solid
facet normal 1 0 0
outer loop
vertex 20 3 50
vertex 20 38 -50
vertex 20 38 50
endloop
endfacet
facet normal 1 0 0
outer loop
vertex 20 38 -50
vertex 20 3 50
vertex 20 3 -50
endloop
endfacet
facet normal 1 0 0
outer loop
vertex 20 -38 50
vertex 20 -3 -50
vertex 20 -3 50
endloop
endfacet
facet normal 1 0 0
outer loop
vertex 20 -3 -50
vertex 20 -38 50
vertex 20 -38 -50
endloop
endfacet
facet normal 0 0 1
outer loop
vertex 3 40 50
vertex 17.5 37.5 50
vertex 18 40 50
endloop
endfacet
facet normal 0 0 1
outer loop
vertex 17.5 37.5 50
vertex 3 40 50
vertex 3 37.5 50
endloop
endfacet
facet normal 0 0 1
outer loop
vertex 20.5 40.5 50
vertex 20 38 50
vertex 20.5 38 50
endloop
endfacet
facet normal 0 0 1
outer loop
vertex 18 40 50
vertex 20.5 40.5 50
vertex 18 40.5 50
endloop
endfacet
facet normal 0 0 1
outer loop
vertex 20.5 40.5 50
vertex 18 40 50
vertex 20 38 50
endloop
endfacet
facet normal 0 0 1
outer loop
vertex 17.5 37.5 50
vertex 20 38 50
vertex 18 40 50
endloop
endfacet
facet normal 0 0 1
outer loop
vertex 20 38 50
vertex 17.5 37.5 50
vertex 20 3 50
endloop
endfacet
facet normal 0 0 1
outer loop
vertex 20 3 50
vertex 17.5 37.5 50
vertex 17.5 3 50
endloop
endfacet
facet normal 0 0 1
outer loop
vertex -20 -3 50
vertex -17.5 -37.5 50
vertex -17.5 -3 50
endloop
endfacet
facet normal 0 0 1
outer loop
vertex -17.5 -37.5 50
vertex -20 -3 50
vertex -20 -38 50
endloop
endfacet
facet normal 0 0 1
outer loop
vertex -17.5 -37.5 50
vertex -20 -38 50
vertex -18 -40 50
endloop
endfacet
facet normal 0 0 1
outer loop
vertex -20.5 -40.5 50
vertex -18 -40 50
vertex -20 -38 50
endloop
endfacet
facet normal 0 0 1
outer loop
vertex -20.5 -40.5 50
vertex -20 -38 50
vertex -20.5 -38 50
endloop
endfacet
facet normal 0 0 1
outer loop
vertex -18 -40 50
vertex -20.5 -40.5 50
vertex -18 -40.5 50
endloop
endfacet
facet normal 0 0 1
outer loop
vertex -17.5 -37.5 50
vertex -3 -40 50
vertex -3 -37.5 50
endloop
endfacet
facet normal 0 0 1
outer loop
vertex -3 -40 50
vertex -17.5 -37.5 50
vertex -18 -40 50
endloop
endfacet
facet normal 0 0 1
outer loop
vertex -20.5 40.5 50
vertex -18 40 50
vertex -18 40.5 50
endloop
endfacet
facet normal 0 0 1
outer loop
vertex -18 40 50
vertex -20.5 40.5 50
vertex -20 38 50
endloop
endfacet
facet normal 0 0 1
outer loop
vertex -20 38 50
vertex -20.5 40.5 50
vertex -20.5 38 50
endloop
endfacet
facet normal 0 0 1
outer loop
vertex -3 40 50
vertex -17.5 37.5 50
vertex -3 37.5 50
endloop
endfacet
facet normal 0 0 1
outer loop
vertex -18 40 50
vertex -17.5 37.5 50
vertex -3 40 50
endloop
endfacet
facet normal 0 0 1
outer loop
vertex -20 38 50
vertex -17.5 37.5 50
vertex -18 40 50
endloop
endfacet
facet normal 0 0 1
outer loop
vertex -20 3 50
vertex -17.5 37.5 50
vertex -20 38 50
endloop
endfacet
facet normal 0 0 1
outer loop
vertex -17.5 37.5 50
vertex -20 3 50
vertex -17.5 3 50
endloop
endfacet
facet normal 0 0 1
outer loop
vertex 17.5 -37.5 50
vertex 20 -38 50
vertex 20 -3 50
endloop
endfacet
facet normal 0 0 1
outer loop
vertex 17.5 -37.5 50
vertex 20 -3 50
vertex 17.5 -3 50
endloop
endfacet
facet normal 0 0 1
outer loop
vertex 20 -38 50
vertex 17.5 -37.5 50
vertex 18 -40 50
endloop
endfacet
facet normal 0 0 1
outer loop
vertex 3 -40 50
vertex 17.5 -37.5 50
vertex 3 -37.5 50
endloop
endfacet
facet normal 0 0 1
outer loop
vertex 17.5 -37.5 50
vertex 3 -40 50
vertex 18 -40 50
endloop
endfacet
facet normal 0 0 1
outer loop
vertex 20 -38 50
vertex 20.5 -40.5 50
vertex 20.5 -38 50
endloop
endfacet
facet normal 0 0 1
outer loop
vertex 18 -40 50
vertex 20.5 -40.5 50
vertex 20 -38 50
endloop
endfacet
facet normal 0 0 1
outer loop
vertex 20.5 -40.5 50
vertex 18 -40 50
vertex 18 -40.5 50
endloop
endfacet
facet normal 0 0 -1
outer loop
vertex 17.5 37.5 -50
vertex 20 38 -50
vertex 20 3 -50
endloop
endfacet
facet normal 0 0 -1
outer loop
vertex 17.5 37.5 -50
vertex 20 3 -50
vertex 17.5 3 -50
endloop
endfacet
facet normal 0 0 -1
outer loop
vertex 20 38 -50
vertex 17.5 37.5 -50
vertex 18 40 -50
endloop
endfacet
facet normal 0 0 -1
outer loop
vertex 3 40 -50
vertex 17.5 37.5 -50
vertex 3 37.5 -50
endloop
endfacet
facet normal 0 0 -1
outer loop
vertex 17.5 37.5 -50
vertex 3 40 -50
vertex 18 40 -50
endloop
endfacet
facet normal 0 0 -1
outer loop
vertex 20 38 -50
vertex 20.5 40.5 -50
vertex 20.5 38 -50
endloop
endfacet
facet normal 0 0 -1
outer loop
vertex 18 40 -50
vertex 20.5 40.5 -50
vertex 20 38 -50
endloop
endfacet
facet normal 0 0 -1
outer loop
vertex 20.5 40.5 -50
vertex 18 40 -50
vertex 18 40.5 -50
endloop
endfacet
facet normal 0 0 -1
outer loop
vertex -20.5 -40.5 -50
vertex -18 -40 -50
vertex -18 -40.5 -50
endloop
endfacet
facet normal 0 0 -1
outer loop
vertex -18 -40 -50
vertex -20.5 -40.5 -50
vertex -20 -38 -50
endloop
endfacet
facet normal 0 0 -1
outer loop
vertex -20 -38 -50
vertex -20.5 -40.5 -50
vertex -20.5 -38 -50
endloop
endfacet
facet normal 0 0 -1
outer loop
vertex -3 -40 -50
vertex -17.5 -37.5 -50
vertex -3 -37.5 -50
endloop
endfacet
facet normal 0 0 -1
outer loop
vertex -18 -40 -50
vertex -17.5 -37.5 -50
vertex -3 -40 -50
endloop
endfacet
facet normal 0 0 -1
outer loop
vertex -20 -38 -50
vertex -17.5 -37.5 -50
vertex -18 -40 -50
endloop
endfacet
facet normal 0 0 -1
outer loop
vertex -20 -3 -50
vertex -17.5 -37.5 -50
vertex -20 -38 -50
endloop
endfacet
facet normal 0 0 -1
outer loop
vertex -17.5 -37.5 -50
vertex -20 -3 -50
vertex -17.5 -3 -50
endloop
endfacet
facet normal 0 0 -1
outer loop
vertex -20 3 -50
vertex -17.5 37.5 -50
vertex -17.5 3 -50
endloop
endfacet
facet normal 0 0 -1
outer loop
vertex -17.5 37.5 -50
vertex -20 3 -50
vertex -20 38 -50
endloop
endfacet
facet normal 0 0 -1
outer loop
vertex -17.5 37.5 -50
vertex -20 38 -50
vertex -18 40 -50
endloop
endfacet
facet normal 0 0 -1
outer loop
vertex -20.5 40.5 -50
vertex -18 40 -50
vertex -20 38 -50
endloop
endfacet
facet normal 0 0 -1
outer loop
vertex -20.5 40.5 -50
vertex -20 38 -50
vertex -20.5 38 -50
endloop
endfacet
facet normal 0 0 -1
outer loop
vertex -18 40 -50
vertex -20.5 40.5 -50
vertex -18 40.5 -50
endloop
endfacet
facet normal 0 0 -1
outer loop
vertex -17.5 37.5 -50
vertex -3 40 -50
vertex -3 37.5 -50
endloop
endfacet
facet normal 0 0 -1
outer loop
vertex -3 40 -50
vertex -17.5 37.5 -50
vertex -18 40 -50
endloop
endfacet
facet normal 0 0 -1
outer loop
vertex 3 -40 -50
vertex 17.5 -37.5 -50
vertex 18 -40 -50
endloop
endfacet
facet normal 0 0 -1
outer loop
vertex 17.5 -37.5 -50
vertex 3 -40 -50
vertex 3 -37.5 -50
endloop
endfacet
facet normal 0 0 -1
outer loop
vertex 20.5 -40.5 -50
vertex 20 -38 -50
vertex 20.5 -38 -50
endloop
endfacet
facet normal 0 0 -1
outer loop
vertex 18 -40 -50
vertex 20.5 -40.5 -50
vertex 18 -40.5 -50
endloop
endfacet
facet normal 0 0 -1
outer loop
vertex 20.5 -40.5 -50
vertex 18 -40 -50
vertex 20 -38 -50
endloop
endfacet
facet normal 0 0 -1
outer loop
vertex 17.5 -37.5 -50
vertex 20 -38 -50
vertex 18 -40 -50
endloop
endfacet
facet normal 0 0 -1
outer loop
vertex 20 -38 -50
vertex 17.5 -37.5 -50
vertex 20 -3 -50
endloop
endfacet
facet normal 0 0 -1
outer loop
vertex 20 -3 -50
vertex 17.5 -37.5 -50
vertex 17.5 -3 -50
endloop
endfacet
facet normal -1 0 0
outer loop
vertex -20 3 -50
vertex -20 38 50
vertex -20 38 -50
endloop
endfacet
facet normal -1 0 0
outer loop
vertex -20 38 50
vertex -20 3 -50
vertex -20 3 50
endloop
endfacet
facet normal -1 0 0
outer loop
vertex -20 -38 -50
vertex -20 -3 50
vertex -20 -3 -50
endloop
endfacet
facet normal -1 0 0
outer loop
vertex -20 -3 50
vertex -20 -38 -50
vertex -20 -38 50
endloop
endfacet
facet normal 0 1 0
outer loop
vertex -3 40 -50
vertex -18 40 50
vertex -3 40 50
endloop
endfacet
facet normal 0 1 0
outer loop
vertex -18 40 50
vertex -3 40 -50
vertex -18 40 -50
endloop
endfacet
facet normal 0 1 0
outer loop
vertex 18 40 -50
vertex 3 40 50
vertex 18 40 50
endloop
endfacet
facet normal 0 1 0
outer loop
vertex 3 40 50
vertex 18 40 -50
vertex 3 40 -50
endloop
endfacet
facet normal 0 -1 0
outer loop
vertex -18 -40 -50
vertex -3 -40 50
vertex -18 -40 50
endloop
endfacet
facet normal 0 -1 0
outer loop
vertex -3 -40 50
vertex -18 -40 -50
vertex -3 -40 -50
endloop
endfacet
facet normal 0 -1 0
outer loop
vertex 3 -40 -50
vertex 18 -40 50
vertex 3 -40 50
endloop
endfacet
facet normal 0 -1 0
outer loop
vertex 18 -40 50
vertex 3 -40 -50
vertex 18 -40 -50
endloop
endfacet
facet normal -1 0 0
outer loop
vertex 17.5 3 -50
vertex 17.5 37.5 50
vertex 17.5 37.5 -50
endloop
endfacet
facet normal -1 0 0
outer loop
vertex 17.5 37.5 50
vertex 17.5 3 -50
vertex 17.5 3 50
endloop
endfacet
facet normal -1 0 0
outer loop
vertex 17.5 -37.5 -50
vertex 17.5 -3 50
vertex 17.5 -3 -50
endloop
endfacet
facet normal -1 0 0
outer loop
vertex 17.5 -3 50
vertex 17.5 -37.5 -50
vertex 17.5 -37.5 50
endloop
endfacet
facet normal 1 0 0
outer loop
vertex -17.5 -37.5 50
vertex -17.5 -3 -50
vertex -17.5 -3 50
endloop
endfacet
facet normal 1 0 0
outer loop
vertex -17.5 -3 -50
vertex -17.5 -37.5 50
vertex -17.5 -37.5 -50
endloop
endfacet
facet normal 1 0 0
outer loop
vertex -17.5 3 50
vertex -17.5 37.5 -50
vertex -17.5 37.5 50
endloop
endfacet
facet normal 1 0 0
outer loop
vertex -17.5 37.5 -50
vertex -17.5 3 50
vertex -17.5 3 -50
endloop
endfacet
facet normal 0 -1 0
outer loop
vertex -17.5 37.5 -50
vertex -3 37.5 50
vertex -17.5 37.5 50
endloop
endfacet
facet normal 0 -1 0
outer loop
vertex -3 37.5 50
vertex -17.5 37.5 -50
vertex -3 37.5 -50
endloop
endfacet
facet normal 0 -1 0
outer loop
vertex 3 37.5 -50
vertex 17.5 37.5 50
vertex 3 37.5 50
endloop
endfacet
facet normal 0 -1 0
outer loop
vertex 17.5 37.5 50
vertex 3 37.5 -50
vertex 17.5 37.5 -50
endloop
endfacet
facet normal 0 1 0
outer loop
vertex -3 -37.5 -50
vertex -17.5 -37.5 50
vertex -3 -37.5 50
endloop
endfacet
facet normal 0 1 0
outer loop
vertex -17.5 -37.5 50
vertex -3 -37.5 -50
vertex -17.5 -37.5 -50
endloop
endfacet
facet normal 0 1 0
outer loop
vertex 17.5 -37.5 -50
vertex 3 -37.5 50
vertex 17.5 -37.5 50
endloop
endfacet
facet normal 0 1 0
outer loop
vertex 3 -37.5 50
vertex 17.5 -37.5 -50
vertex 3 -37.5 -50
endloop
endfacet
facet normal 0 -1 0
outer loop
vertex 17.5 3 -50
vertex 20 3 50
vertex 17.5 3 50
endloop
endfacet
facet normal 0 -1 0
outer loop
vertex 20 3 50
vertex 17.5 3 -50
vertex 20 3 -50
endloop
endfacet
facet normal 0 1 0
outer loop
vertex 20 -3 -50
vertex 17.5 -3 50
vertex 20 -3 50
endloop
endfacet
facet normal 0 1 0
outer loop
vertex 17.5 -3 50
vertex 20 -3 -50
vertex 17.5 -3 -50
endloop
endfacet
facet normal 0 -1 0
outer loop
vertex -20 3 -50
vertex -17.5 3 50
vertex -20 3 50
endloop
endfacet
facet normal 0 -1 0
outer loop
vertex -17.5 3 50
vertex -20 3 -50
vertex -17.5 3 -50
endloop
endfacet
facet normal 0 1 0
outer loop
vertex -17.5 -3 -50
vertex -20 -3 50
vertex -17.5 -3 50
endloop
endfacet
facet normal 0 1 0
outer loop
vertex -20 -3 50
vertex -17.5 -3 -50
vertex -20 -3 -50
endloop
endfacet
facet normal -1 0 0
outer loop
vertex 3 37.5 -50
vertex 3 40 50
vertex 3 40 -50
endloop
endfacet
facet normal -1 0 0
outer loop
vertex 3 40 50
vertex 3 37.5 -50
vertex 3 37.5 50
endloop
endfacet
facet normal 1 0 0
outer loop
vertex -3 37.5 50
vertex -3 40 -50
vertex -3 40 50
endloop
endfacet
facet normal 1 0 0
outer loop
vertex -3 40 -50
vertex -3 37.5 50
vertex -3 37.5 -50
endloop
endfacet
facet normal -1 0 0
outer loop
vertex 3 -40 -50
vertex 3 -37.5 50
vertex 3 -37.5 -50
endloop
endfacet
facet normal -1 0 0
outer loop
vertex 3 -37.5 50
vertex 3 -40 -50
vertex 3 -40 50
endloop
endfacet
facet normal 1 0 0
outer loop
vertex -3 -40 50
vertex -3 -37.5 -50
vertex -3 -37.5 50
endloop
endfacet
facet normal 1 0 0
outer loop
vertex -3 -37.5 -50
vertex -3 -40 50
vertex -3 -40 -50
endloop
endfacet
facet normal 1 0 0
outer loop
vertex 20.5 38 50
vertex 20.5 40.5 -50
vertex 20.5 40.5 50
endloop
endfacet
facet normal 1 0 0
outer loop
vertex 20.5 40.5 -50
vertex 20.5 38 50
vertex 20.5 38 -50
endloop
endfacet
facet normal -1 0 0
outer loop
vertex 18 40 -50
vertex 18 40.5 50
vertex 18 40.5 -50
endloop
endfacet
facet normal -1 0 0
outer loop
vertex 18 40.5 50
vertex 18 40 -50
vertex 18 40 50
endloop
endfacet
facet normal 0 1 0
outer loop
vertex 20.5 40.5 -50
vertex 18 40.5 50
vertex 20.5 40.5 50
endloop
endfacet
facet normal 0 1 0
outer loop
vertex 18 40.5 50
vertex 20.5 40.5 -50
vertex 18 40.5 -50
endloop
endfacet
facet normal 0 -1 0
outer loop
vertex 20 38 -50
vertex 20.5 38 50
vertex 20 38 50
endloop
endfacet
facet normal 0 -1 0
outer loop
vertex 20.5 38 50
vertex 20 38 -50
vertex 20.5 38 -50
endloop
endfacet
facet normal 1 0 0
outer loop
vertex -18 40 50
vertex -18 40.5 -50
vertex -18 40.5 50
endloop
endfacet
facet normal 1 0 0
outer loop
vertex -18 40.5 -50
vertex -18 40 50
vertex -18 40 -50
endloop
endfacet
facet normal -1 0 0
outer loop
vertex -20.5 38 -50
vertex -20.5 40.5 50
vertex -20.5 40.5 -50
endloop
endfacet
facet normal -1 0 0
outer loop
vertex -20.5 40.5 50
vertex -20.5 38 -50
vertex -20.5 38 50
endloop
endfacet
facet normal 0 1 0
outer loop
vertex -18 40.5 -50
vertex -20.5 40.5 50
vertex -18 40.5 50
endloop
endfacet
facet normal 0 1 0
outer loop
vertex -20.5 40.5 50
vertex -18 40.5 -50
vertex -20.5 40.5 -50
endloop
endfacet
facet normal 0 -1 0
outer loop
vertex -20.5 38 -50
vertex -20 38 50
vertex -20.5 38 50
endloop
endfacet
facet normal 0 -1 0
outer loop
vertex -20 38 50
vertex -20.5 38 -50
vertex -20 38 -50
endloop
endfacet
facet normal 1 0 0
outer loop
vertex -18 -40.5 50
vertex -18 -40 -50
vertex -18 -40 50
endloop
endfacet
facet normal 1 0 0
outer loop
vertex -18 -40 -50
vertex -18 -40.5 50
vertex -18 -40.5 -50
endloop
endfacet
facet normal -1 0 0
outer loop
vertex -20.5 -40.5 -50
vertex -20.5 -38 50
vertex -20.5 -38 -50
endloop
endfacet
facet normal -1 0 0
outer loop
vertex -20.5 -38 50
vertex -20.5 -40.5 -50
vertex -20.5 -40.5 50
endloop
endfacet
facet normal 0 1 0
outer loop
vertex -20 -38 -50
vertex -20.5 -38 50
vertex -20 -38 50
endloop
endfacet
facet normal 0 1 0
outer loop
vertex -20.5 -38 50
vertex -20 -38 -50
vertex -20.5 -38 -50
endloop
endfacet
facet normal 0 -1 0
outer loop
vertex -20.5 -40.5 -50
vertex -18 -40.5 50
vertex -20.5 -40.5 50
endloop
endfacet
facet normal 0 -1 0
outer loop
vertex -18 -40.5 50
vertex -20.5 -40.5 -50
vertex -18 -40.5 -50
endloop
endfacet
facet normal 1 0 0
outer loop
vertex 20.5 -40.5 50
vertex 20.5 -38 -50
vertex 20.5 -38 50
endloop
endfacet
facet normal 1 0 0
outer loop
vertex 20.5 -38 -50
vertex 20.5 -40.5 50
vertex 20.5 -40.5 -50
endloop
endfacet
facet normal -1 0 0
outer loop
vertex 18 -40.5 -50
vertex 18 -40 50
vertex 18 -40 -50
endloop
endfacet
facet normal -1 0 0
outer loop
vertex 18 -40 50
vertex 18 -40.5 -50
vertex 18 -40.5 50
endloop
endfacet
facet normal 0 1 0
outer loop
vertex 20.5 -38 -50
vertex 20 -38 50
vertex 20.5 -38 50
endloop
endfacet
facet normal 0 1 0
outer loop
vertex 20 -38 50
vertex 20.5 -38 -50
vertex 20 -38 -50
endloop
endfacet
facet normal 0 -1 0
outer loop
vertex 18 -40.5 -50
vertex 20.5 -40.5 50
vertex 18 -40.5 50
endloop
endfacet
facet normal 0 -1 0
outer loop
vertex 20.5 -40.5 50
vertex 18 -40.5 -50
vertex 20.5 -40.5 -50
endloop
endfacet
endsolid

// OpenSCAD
// Parameters
cross_section_width_mm = 40; //[20:80:1]
cross_section_height_mm = 80; //[40:160:1]
length_mm = 100; //[50:200:1]
center = 1; //[0:1:1]
cornerHole = 1; //[0:1:1]
wall_thickness_mm = 2.5; //[1.5:5:0.1]
slot_opening_mm = 6; //[4:10:0.5]
slot_depth_mm = 8; //[4:16:0.5]
center_hole_diameter_mm = 8.2; //[4:16:0.1]
corner_hole_diameter_mm = 5.5; //[3:10:0.1]
corner_hole_inset_mm = 10; //[6:16:0.5]
overlap_mm = 1; //[0.5:2:0.1]

// Extrusion - complete geometry
module extrusion() {
  color("Silver") {
    difference() {
      // Outer body
      cube([cross_section_width_mm, cross_section_height_mm, length_mm], center=true);
      
      // Internal voids/channels
      translate([0, 0, 0])
        cube([cross_section_width_mm - 2*wall_thickness_mm, cross_section_height_mm - 2*wall_thickness_mm, length_mm + 2*overlap_mm], center=true);
      
      // Slots
      translate([cross_section_width_mm/2 - slot_depth_mm/2, 0, 0])
        cube([slot_depth_mm + 2*overlap_mm, slot_opening_mm, length_mm + 2*overlap_mm], center=true);
      translate([-(cross_section_width_mm/2 - slot_depth_mm/2), 0, 0])
        cube([slot_depth_mm + 2*overlap_mm, slot_opening_mm, length_mm + 2*overlap_mm], center=true);
      translate([0, cross_section_height_mm/2 - slot_depth_mm/2, 0])
        cube([slot_opening_mm, slot_depth_mm + 2*overlap_mm, length_mm + 2*overlap_mm], center=true);
      translate([0, -(cross_section_height_mm/2 - slot_depth_mm/2), 0])
        cube([slot_opening_mm, slot_depth_mm + 2*overlap_mm, length_mm + 2*overlap_mm], center=true);
      
      // Center hole
      cylinder(h=length_mm + 2*overlap_mm, r=center_hole_diameter_mm/2, center=true);
      
      // Corner holes
      if (cornerHole) {
        translate([cross_section_width_mm/2 - corner_hole_inset_mm, cross_section_height_mm/2 - corner_hole_inset_mm, 0])
          cylinder(h=length_mm + 2*overlap_mm, r=corner_hole_diameter_mm/2, center=true);
        translate([-(cross_section_width_mm/2 - corner_hole_inset_mm), cross_section_height_mm/2 - corner_hole_inset_mm, 0])
          cylinder(h=length_mm + 2*overlap_mm, r=corner_hole_diameter_mm/2, center=true);
        translate([-(cross_section_width_mm/2 - corner_hole_inset_mm), -(cross_section_height_mm/2 - corner_hole_inset_mm), 0])
          cylinder(h=length_mm + 2*overlap_mm, r=corner_hole_diameter_mm/2, center=true);
        translate([cross_section_width_mm/2 - corner_hole_inset_mm, -(cross_section_height_mm/2 - corner_hole_inset_mm), 0])
          cylinder(h=length_mm + 2*overlap_mm, r=corner_hole_diameter_mm/2, center=true);
      }
    }
  }
}

// Box Corner Profile Section - complete geometry
module box_corner_profile_section() {
  color("DimGray") {
    cube([wall_thickness_mm, wall_thickness_mm, length_mm], center=true);
  }
}

// Box Corner Profile Sections - complete geometry
module box_corner_profile_sections() {
  union() {
    translate([cross_section_width_mm/2 - wall_thickness_mm/2 + overlap_mm/2, cross_section_height_mm/2 - wall_thickness_mm/2 + overlap_mm/2, 0])
      box_corner_profile_section();
    translate([-(cross_section_width_mm/2 - wall_thickness_mm/2 + overlap_mm/2), cross_section_height_mm/2 - wall_thickness_mm/2 + overlap_mm/2, 0])
      box_corner_profile_section();
    translate([-(cross_section_width_mm/2 - wall_thickness_mm/2 + overlap_mm/2), -(cross_section_height_mm/2 - wall_thickness_mm/2 + overlap_mm/2), 0])
      box_corner_profile_section();
    translate([cross_section_width_mm/2 - wall_thickness_mm/2 + overlap_mm/2, -(cross_section_height_mm/2 - wall_thickness_mm/2 + overlap_mm/2), 0])
      box_corner_profile_section();
  }
}

// Assembly
module assembly() {
  extrusion();
  box_corner_profile_sections();
}

assembly();
